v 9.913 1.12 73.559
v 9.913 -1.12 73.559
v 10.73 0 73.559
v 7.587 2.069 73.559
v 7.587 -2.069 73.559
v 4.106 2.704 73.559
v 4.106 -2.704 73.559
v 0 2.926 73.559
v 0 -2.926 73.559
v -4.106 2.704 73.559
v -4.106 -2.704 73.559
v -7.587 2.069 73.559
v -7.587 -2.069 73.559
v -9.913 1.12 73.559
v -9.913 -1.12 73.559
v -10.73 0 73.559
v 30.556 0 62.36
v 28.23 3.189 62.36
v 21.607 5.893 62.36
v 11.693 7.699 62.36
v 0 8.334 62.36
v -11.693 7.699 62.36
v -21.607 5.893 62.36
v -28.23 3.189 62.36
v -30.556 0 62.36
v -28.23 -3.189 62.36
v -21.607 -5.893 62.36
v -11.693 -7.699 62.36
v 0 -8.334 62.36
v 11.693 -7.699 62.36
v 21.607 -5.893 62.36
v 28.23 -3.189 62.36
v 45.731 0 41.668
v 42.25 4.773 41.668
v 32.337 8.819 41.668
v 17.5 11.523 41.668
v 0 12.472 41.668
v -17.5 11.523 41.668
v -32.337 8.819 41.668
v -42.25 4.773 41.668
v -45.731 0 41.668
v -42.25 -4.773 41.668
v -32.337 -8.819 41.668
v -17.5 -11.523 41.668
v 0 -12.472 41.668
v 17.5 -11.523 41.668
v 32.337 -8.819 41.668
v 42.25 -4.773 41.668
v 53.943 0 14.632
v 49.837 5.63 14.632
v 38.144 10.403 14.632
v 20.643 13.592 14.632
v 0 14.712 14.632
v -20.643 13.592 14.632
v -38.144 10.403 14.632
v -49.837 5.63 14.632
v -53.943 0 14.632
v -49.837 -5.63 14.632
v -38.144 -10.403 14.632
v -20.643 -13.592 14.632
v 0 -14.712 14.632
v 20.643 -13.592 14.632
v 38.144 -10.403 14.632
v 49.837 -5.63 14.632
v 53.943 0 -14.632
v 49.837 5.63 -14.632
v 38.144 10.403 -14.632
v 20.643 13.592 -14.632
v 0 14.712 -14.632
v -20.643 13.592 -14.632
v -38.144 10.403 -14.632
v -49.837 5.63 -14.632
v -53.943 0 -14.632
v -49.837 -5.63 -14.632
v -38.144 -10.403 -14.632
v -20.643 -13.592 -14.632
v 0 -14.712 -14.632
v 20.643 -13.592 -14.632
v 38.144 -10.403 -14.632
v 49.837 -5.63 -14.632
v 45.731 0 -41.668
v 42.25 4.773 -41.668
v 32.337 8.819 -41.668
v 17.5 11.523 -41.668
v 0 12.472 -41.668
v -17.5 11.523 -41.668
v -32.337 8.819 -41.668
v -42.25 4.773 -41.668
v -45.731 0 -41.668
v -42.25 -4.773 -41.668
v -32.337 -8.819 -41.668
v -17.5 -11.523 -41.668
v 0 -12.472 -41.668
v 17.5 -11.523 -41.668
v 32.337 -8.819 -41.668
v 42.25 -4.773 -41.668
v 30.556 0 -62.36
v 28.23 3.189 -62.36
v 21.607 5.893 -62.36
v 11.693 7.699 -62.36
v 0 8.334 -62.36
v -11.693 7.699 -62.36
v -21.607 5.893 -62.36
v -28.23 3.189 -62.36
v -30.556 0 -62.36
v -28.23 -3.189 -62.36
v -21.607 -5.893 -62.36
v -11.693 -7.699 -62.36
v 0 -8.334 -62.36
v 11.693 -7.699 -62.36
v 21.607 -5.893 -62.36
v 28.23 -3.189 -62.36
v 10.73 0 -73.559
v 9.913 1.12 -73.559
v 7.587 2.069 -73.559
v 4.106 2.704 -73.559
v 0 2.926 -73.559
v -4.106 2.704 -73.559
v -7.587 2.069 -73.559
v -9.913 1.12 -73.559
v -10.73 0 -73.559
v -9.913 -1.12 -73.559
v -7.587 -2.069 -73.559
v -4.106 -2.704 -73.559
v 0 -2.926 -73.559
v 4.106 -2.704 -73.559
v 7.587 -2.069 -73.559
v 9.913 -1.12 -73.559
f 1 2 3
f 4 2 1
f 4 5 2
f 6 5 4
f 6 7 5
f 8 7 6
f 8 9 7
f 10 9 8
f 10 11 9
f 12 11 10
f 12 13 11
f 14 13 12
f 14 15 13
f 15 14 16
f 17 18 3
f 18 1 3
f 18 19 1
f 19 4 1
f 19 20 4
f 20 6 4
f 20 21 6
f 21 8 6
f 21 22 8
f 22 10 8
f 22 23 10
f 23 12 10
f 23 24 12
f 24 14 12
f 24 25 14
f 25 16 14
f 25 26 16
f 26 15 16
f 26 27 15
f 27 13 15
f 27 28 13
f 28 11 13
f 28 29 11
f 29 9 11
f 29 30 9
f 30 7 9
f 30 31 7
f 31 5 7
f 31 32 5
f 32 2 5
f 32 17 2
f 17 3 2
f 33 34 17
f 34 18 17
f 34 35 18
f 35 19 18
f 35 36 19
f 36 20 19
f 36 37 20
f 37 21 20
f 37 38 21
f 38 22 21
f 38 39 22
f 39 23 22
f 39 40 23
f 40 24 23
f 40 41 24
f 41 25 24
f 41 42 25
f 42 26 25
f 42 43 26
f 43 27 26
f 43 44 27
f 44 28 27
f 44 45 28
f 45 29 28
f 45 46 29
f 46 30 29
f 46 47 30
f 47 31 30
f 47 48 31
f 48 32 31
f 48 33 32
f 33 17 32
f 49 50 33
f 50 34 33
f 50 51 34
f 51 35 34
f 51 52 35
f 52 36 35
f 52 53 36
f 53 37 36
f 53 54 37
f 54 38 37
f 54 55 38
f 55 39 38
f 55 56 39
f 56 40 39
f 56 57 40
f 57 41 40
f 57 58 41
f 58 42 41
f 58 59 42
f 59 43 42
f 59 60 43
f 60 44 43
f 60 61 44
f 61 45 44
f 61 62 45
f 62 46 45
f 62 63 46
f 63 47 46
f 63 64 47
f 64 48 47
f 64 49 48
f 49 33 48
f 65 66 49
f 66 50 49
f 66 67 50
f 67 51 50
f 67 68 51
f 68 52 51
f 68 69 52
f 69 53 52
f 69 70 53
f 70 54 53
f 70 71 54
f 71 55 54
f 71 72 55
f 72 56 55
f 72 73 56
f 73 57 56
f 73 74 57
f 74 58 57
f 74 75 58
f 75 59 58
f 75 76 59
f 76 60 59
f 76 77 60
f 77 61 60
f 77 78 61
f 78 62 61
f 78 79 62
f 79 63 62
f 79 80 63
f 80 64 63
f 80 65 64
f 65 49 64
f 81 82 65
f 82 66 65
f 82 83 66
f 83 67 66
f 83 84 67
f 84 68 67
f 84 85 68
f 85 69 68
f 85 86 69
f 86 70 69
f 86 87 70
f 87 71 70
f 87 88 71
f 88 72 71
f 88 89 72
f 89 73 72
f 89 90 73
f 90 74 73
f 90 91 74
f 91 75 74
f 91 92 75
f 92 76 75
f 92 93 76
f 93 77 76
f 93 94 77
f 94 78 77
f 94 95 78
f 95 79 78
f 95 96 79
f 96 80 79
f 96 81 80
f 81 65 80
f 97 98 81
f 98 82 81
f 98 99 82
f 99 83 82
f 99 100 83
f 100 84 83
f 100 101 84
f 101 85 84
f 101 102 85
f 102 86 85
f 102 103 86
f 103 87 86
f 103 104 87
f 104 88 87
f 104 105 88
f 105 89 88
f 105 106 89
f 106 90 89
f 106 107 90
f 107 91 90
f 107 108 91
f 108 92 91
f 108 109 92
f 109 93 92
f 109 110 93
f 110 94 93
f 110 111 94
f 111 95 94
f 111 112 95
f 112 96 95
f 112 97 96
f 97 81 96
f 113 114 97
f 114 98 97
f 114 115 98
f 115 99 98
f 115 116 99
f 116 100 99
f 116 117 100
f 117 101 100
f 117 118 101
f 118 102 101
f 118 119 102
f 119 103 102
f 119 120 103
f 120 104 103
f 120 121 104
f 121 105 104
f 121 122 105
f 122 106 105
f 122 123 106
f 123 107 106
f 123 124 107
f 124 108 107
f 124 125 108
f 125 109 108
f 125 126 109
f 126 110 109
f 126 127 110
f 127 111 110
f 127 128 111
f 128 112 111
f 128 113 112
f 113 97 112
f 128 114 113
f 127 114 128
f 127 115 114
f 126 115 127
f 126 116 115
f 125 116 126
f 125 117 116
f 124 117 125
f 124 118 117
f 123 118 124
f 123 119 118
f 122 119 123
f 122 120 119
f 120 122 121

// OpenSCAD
// Generated by SolidPython 1.0.1 on 2020-07-29 00:46:49


scale(v = [11, 3, 15]) {
	sphere(r = 5);
}
/***********************************************
*********      SolidPython code:      **********
************************************************
 
# import packages: SolidPython
from solid import *
from solid.utils import *
from itertools import chain, combinations, permutations


class Resize:

    def __init__(self, scad_file):
        self.scad_file = scad_file
        #self.scad_file = import_scad(scad_file)
        # cone/cylinder param:
        self.r1 = 0
        self.r2 = 0
        self.h = 0
        # rectangular prism param:
        self.w = 0
        self.l = 0
        # ellipse param:
        self.r = 0

    # import OpenScad code (file name corresponds to shape)


    # classify shape + parameters
    def assign(self, param1, param2, param3):
        if self.scad_file == 'cone.scad':
            self.r1 = param1
            self.r2 = param2
            self.h = param3
        elif self.scad_file == 'cylinder.scad':
            self.r1 = param1
            self.r2 = param2
            self.h = param3
        elif self.scad_file == 'rectangularPrism.scad':
            self.h = param1
            self.l = param2
            self.w = param3
        else:
            self.r = param1
            self.h = param2

    # resize parameters
    def iterate(self):
        x = range(3, 20, 2)
        i = 1
        if self.scad_file == 'cone.scad':
            tempList = list(permutations(x, 2))
            for temp in tempList:
                param1 = temp[0]
                param2 = temp[1]
                filepath = 'produced_scad_files/' + 'cone' + str(param1) + '_' + str(param2) + '_' + '.scad'
                scad_render_to_file(cylinder(h=param1, r1=param2, r2=0), filepath)

        elif self.scad_file == 'cylinder.scad':
            tempList = list(permutations(x, 3))
            for temp in tempList:
                param1 = temp[0]
                param2 = temp[1]
                filepath = 'produced_scad_files/' + 'cylinder' + str(param1) + '_' + str(param2) + '_' + '.scad'
                scad_render_to_file(cylinder(h=param1, r1=param2, r2=param2), filepath)

        elif self.scad_file == 'rectangularPrism.scad':
            tempList = list(permutations(x, 3))
            for temp in tempList:
                param1 = temp[0]
                param2 = temp[1]
                param3 = temp[2]
                filepath = 'produced_scad_files/' + 'rectangularPrism' + str(param1) + '_' + str(param2) + '_' + str(
                    param3) + '.scad'
                scad_render_to_file(cube(size=(param1, param2, param3)), filepath)

        elif self.scad_file == 'ellipse.scad':
            tempList = list(permutations(x, 4))
            for temp in tempList:
                param1 = temp[0]
                param2 = temp[1]
                param3 = temp[2]
                param4 = temp[3]
                filepath = 'produced_scad_files/' + 'ellipse' + str(param1) + '_' + str(param2) + '_' + str(param3) + '_' + str(param4) + '.scad'
                scad_render_to_file(scale([param1, param2, param3])(sphere(r=param4)), filepath)

    def render_to_scadfile(self):
        scad_render_to_file(scad, 'example.scad') 
 
************************************************/
